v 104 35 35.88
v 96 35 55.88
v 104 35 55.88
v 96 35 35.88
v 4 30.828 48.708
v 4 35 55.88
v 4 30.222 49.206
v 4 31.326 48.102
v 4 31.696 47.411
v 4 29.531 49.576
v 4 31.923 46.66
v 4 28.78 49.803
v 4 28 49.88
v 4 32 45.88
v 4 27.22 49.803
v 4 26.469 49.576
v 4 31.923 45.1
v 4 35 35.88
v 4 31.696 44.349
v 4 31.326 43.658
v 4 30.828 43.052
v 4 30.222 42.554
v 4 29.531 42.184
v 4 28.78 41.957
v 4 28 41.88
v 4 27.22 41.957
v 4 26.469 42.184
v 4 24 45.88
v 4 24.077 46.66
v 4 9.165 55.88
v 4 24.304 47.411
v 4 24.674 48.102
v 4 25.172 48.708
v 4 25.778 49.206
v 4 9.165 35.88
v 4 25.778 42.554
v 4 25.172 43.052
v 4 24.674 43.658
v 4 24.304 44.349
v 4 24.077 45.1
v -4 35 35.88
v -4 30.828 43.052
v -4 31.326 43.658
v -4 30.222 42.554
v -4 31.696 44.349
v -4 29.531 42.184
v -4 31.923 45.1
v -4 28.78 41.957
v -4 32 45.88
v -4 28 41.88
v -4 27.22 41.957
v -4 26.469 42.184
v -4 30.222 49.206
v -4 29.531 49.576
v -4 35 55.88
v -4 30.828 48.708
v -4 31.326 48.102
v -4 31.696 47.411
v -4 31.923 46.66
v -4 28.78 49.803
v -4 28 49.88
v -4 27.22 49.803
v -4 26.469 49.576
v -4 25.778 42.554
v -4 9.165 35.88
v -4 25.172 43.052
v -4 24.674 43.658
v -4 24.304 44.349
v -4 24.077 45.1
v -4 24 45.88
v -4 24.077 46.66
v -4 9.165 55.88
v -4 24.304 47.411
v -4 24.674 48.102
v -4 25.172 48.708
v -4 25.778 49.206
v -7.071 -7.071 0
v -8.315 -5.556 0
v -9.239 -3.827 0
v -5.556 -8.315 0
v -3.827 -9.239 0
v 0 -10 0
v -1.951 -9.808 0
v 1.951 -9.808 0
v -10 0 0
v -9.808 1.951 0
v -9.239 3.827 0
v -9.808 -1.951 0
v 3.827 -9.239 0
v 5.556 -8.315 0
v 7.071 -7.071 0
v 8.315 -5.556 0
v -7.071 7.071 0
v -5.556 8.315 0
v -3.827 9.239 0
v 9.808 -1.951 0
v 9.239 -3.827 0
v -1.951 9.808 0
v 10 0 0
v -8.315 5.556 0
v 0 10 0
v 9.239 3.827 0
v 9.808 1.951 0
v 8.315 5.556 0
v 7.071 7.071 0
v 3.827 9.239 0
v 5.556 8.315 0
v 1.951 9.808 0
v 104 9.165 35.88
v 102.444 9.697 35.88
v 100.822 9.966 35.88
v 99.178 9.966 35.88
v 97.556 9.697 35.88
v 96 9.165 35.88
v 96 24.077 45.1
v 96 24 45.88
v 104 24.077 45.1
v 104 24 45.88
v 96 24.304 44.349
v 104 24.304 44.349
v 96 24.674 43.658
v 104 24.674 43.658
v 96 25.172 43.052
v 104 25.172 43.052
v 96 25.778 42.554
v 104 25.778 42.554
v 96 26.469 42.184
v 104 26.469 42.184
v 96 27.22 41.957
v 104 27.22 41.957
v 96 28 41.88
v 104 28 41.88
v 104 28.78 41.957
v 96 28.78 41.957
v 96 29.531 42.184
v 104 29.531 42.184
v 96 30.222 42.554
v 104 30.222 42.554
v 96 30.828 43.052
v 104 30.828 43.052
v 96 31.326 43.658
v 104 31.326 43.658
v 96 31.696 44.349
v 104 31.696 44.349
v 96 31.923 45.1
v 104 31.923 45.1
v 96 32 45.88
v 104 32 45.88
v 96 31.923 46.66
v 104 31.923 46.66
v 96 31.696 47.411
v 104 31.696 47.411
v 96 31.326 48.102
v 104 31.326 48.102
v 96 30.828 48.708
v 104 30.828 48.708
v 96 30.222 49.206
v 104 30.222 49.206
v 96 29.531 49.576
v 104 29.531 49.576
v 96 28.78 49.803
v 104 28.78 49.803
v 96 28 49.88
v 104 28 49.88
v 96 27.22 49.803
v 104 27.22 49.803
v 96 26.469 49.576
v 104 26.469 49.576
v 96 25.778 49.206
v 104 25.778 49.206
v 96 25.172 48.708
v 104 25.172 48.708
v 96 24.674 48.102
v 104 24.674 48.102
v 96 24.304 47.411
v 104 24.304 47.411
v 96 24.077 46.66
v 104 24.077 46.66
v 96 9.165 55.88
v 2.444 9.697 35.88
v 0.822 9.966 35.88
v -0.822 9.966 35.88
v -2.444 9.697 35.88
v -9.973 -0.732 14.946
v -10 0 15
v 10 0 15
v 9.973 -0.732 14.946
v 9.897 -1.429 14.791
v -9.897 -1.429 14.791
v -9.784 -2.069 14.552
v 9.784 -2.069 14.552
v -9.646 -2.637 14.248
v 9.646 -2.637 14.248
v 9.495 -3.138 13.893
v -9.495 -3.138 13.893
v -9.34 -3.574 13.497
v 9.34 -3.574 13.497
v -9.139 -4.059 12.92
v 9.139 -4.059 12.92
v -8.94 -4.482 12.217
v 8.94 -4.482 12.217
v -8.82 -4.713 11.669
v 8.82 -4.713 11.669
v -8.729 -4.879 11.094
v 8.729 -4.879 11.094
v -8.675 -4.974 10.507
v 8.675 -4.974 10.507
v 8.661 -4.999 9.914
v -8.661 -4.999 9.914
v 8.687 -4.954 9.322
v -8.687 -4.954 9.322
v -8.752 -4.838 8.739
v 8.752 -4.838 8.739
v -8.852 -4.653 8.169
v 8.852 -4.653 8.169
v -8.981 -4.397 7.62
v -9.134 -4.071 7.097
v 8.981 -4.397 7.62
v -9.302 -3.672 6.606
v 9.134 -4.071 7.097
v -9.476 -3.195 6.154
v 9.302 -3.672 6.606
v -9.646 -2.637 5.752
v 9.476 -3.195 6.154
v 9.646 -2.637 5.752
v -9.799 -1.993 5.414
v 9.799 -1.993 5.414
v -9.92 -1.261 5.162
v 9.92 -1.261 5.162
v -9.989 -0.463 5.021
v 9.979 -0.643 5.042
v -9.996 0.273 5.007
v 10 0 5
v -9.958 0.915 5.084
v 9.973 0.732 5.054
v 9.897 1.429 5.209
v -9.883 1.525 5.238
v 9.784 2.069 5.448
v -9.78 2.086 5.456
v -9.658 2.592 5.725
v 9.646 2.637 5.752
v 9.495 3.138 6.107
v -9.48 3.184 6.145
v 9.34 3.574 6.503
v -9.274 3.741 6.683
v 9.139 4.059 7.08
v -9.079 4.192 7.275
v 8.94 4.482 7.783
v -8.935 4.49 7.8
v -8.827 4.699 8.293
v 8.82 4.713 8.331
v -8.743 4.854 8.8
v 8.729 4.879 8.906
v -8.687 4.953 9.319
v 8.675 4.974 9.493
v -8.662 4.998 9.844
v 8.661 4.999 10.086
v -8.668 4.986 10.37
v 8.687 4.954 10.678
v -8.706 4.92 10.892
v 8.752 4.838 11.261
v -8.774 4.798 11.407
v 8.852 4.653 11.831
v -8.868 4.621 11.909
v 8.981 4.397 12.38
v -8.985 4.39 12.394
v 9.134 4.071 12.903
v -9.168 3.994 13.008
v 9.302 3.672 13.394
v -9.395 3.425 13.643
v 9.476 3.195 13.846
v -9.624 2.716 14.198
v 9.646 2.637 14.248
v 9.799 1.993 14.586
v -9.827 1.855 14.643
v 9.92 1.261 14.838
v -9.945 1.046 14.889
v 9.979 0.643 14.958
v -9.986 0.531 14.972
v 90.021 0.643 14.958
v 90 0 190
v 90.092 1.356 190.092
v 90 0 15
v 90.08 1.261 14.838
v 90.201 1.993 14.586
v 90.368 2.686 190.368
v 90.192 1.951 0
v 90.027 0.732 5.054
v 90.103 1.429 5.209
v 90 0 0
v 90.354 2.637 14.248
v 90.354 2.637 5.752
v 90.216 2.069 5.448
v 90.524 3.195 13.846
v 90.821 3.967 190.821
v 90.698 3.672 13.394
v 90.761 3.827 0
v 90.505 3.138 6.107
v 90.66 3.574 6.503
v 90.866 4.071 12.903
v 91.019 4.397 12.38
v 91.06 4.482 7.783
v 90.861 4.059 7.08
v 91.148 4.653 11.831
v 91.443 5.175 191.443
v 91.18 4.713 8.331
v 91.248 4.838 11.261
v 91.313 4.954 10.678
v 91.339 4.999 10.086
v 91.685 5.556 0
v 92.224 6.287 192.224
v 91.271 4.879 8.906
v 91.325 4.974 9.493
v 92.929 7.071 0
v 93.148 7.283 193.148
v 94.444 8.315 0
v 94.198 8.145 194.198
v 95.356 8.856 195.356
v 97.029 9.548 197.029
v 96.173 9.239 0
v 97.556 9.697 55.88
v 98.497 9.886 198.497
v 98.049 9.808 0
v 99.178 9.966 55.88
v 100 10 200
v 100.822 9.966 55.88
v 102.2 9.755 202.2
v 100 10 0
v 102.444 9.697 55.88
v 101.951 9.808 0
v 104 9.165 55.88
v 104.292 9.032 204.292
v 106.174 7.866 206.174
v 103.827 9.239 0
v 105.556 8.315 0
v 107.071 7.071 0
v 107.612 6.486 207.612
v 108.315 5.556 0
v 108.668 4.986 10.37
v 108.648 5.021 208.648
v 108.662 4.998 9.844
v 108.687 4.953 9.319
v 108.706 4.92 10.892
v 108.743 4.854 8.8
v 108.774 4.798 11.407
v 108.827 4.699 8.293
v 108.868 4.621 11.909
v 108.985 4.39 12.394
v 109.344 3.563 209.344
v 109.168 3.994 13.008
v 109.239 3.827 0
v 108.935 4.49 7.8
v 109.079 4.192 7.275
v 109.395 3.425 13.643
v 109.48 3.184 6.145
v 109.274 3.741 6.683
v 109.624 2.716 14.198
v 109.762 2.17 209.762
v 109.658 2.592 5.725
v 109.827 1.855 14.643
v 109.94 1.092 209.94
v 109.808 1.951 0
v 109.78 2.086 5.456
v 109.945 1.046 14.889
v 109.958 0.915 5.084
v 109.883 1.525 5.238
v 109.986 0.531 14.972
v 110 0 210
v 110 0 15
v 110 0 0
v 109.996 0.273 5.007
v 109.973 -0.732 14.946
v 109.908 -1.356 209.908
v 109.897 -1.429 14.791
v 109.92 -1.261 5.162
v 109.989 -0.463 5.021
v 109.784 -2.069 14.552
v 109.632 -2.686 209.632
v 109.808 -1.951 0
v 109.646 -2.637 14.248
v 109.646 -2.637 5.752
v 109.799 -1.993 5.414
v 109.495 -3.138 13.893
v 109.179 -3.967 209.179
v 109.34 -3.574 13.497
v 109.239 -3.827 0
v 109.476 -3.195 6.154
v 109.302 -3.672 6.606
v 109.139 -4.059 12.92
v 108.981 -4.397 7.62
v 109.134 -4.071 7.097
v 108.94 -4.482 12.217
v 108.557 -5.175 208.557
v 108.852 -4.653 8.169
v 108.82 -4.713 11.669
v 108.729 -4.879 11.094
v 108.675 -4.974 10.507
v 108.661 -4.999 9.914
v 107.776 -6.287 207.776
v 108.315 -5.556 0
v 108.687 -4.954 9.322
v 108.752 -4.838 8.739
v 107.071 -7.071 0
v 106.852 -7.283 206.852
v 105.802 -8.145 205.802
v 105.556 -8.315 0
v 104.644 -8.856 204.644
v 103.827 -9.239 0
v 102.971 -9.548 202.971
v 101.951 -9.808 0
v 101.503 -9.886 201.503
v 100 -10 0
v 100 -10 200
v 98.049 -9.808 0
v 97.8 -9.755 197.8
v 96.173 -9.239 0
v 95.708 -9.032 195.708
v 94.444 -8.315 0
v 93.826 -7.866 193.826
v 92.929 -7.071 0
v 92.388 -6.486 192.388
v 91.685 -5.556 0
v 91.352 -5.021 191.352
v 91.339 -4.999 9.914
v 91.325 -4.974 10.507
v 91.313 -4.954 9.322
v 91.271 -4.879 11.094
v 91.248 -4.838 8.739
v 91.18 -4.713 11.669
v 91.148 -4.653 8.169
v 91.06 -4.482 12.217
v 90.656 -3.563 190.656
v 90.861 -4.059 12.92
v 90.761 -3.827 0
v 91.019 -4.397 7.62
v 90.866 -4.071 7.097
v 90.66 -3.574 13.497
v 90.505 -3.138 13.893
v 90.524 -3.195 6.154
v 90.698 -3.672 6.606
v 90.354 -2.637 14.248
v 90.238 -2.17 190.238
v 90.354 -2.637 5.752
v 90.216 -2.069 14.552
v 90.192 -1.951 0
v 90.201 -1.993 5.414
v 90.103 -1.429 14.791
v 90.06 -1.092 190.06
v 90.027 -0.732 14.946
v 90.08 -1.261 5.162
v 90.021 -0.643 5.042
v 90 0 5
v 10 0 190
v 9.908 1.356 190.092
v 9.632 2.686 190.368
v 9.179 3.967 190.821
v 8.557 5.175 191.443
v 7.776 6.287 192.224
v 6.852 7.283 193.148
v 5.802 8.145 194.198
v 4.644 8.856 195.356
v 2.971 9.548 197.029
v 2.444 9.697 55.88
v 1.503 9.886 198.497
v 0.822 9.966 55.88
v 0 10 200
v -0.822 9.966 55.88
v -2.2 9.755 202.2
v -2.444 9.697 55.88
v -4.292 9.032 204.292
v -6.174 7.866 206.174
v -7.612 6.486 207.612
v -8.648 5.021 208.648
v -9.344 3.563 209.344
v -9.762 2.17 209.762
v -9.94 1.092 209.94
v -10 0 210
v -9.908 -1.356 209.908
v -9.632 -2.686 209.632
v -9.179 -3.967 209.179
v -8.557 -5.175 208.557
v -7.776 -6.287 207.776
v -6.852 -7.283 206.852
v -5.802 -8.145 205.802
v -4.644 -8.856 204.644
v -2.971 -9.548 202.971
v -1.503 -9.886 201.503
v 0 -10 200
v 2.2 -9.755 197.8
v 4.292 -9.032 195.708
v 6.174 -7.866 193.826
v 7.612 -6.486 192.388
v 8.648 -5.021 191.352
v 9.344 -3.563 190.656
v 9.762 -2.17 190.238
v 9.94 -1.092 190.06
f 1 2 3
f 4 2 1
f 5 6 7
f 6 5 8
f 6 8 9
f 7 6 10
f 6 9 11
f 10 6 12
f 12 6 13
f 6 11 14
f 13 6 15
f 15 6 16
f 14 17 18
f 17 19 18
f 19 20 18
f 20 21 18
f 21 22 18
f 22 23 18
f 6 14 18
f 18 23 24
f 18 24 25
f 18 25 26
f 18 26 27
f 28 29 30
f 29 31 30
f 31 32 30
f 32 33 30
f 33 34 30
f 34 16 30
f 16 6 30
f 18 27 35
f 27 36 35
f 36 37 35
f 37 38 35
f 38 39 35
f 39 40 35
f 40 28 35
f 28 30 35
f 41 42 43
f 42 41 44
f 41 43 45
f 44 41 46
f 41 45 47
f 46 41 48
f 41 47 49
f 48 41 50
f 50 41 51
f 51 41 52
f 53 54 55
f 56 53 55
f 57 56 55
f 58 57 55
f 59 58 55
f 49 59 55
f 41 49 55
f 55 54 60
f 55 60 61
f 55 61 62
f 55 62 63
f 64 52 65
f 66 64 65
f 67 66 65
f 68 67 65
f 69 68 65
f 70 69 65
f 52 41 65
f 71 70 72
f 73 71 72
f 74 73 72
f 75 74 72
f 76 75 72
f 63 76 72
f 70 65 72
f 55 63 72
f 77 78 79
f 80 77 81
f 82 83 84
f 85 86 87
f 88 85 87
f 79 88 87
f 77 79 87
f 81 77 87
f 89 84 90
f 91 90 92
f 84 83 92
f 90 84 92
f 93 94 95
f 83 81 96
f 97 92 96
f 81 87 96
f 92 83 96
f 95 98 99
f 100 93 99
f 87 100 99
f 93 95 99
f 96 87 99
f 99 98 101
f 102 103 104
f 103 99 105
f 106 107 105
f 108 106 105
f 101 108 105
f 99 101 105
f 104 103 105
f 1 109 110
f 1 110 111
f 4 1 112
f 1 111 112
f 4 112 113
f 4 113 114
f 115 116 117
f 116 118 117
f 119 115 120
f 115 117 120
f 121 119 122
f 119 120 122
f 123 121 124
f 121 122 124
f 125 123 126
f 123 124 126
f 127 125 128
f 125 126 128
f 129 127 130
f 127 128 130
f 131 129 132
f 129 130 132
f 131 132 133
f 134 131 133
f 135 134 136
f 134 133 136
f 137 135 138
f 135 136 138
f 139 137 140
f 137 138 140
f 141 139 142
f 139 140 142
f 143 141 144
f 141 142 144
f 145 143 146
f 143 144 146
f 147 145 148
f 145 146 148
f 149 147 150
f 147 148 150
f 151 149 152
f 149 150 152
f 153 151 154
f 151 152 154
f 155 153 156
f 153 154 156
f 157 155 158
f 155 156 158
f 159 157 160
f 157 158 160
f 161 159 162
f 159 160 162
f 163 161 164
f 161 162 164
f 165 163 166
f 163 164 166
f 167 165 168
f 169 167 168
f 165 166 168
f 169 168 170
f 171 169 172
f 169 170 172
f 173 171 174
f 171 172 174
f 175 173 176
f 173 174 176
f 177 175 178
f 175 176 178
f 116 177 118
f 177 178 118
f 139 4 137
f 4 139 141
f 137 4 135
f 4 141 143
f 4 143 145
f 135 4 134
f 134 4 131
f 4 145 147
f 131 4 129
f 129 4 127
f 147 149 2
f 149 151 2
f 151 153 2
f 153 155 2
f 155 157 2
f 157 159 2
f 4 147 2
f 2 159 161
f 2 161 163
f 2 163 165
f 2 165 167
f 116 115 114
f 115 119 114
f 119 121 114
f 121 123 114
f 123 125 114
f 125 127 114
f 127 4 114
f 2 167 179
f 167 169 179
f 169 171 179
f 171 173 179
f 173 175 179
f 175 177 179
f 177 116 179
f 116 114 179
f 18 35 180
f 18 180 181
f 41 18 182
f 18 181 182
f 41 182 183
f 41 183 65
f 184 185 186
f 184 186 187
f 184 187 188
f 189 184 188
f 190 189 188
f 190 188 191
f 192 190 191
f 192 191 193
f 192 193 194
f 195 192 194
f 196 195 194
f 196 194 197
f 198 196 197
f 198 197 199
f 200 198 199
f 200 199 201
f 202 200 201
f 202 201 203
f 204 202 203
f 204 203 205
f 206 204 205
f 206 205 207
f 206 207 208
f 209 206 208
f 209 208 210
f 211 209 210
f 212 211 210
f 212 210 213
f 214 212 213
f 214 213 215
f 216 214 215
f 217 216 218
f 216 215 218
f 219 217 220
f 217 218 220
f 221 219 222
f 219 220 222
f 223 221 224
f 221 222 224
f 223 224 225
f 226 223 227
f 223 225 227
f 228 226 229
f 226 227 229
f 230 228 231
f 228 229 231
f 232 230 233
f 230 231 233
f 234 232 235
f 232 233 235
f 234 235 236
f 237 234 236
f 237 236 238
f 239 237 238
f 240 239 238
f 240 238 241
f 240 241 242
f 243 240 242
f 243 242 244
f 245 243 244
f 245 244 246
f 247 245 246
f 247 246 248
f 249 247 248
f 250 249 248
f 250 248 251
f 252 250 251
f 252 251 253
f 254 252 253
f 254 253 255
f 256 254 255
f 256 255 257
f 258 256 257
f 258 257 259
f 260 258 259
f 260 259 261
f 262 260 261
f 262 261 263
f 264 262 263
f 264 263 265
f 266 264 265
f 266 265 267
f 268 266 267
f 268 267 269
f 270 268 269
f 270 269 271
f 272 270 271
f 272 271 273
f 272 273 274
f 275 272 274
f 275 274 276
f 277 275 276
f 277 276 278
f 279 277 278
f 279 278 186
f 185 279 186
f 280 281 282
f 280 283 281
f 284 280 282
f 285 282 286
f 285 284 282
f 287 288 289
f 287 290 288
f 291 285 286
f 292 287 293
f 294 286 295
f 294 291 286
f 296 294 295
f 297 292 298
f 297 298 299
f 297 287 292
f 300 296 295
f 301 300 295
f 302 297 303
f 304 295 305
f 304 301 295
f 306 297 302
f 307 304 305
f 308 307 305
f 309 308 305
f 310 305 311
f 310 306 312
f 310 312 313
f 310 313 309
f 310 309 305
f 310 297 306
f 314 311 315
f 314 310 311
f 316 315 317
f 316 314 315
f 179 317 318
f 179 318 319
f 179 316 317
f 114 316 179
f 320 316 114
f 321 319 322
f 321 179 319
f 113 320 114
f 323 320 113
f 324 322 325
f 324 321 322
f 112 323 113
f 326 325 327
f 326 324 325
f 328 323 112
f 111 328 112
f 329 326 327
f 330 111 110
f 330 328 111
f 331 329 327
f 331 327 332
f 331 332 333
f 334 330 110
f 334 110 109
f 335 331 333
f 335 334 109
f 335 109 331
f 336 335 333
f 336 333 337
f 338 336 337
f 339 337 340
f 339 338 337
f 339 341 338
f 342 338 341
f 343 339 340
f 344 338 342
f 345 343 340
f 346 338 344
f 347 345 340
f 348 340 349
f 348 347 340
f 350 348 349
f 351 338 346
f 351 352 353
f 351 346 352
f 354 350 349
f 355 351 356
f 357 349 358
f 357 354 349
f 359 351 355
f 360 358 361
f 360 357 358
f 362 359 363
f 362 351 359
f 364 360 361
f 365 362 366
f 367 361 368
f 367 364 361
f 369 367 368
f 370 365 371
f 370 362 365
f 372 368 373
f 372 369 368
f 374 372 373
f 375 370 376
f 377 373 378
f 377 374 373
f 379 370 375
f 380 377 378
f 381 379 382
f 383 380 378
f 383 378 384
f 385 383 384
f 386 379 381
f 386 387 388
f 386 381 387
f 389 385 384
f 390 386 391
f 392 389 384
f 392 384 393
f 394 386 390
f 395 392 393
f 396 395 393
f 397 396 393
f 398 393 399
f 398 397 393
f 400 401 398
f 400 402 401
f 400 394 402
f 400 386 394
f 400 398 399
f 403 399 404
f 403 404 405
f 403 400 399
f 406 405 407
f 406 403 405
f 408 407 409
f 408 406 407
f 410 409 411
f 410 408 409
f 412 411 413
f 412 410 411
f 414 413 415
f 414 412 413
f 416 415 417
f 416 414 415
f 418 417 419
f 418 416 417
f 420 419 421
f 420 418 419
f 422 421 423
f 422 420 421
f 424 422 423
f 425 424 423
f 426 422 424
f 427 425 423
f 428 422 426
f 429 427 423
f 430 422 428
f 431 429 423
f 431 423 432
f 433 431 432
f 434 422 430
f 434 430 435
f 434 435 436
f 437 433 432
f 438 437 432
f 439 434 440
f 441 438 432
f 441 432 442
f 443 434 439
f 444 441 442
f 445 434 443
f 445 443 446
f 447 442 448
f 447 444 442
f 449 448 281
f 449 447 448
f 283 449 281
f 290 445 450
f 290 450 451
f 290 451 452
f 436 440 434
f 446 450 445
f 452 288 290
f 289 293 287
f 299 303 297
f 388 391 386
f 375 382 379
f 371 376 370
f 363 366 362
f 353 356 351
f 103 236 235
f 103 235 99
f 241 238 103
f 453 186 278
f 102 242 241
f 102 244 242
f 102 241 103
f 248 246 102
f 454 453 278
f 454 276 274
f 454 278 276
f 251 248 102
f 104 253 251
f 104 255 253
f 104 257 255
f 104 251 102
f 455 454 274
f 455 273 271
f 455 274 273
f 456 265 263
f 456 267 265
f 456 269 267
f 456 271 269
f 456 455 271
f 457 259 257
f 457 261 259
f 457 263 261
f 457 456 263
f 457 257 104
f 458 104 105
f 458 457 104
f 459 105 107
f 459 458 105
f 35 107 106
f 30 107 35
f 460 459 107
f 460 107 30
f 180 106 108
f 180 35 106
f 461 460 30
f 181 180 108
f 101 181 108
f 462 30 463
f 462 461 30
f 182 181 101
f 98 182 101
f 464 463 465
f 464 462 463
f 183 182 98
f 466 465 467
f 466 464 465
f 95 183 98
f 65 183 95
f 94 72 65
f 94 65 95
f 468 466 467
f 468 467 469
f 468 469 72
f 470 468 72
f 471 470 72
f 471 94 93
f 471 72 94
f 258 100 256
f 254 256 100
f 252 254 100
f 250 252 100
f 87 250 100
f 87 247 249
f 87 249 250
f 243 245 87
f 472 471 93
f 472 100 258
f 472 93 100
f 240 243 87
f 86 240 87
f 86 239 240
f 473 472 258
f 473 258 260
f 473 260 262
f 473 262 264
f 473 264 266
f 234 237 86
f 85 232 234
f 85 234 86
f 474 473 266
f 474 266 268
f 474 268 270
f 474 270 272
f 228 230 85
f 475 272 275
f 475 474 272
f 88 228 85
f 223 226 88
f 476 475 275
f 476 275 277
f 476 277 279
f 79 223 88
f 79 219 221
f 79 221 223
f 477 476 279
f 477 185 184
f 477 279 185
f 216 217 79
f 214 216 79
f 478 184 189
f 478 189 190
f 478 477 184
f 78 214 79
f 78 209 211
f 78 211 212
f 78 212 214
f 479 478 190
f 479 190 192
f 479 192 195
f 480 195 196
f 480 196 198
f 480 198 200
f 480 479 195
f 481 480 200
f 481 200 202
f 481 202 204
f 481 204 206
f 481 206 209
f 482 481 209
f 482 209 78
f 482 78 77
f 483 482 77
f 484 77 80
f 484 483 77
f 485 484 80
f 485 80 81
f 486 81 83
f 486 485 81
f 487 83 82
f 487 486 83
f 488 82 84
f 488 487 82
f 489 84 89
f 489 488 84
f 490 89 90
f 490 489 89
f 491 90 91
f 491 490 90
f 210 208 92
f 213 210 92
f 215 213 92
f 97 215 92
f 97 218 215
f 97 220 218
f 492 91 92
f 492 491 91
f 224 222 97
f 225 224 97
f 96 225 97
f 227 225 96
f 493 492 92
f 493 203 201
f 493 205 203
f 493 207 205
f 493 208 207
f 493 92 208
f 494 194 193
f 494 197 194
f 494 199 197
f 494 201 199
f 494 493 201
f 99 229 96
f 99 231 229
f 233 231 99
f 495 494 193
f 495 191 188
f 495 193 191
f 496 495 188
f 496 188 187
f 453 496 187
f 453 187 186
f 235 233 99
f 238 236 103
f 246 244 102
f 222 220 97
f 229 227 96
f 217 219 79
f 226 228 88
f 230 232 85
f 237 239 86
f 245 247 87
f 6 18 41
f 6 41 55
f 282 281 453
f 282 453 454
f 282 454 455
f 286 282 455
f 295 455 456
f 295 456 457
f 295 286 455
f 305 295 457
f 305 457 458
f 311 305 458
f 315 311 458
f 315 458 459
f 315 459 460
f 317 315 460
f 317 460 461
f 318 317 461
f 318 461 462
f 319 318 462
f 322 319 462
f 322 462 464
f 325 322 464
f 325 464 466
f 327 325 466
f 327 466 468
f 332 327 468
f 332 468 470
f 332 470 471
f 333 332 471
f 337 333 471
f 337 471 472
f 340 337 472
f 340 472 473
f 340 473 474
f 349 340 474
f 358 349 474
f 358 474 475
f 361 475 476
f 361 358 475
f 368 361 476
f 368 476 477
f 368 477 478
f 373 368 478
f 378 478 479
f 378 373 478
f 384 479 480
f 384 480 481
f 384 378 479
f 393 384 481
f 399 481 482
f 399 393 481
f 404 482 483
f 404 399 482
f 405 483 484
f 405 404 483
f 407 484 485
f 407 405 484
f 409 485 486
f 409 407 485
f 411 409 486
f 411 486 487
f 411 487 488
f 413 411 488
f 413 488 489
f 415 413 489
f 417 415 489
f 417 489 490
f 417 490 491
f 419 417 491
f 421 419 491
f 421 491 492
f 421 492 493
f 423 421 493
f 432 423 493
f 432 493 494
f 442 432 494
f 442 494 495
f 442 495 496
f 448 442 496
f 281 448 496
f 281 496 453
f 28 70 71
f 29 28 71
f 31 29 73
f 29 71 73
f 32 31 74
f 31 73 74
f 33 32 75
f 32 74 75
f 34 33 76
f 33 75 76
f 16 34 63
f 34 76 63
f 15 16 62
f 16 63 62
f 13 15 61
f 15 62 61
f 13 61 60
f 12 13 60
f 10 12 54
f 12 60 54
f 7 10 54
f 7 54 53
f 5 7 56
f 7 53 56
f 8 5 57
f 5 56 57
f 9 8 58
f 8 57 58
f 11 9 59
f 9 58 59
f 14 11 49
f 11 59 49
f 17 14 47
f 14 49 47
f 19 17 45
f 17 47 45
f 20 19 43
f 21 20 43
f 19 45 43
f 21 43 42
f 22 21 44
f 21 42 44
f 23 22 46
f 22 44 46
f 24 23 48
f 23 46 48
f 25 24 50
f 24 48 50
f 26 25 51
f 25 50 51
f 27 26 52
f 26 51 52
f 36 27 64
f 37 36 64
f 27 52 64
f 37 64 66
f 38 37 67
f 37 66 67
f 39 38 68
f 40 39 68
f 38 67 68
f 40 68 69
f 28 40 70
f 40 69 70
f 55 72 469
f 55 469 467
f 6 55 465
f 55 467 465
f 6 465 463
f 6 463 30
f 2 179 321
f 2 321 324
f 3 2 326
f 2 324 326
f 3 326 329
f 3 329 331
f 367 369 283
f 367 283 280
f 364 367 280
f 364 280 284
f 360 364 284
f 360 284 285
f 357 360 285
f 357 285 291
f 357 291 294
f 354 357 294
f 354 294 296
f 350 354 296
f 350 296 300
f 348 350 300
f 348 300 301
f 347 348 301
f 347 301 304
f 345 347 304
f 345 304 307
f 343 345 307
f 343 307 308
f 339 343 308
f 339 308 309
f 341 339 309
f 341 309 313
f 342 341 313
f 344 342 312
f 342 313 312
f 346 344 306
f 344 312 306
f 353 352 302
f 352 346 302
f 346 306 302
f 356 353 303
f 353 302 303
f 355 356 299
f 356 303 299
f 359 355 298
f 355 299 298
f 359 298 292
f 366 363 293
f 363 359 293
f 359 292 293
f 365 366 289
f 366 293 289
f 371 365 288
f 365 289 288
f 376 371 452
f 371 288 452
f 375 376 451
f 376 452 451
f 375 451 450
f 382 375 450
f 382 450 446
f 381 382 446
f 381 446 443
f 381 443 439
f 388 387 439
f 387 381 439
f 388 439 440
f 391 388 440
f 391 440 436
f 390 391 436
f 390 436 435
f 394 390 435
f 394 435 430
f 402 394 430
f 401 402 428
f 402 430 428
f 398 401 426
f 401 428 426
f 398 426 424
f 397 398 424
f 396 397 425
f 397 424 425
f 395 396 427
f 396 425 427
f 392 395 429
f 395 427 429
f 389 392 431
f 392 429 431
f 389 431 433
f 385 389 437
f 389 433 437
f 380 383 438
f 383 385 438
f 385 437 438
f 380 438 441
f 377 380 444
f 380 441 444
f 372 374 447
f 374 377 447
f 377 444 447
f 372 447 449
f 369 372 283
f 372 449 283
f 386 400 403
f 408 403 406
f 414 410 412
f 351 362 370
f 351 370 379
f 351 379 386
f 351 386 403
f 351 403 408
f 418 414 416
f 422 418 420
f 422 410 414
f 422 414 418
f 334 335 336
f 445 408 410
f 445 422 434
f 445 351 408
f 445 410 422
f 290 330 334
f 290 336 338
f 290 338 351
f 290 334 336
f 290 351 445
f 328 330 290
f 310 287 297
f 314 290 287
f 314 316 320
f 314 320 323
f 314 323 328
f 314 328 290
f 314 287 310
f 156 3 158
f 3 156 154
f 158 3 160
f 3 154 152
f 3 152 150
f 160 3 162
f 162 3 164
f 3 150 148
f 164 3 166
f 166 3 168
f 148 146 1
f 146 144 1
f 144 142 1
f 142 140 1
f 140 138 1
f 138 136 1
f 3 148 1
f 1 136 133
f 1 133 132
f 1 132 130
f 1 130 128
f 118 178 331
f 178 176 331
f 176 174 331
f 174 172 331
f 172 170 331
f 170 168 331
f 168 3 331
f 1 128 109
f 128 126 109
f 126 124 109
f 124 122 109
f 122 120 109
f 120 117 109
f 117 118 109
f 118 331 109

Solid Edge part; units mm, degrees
sketch "Sketch1" plane through (0, 0, 0) normal (0, -1, 0) x (1, 0, 0)
  line L0 (0, 0) -> (0, 200)
  line L1 (0, 200) -> (100, 200)
  line L2 (100, 200) -> (100, 0)
  dimension "D1" = 200
  dimension "D2" = 100
sketch "Sketch2" plane through (0, 0, 0) normal (0, 0, 1) x (1, 0, 0)
  circle A0 centre (0, 0) radius 10
sweep "SweptProtrusion_1" add profiles "Sketch2" path "Sketch1"
sketch "Sketch3" plane through (0, 0, 0) normal (0, 1, 0) x (-1, 0, 0)
  line L0 (-4, 55.88) -> (-4, 35.88)
  line L1 (-4, 35.88) -> (4, 35.88)
  line L2 (4, 35.88) -> (4, 55.88)
  line L3 (4, 55.88) -> (-4, 55.88)
extrude "ExtrudedProtrusion_1" add sketch "Sketch3" along normal blind 35
sketch "Sketch4" plane through (-4, 14.5826, 70) normal (-1, 0, 0) x (0, -1, 0)
  circle A0 centre (-13.4174, -24.12) radius 4
extrude "ExtrudedCutout_1" cut sketch "Sketch4" against normal blind 16.5198
mirror "Mirror1" about plane through (50, 0, 0) normal (-1, 0, 0) of "ExtrudedProtrusion_1", "ExtrudedCutout_1"
sketch "Sketch5" plane through (10, 0, 105) normal (1, 0, 0) x (0, 0, 1)
  circle A0 centre (-95, 0) radius 5
extrude "ExtrudedCutout_2" cut sketch "Sketch5" along normal mid plane 237.1494
properties material "Stainless steel"
